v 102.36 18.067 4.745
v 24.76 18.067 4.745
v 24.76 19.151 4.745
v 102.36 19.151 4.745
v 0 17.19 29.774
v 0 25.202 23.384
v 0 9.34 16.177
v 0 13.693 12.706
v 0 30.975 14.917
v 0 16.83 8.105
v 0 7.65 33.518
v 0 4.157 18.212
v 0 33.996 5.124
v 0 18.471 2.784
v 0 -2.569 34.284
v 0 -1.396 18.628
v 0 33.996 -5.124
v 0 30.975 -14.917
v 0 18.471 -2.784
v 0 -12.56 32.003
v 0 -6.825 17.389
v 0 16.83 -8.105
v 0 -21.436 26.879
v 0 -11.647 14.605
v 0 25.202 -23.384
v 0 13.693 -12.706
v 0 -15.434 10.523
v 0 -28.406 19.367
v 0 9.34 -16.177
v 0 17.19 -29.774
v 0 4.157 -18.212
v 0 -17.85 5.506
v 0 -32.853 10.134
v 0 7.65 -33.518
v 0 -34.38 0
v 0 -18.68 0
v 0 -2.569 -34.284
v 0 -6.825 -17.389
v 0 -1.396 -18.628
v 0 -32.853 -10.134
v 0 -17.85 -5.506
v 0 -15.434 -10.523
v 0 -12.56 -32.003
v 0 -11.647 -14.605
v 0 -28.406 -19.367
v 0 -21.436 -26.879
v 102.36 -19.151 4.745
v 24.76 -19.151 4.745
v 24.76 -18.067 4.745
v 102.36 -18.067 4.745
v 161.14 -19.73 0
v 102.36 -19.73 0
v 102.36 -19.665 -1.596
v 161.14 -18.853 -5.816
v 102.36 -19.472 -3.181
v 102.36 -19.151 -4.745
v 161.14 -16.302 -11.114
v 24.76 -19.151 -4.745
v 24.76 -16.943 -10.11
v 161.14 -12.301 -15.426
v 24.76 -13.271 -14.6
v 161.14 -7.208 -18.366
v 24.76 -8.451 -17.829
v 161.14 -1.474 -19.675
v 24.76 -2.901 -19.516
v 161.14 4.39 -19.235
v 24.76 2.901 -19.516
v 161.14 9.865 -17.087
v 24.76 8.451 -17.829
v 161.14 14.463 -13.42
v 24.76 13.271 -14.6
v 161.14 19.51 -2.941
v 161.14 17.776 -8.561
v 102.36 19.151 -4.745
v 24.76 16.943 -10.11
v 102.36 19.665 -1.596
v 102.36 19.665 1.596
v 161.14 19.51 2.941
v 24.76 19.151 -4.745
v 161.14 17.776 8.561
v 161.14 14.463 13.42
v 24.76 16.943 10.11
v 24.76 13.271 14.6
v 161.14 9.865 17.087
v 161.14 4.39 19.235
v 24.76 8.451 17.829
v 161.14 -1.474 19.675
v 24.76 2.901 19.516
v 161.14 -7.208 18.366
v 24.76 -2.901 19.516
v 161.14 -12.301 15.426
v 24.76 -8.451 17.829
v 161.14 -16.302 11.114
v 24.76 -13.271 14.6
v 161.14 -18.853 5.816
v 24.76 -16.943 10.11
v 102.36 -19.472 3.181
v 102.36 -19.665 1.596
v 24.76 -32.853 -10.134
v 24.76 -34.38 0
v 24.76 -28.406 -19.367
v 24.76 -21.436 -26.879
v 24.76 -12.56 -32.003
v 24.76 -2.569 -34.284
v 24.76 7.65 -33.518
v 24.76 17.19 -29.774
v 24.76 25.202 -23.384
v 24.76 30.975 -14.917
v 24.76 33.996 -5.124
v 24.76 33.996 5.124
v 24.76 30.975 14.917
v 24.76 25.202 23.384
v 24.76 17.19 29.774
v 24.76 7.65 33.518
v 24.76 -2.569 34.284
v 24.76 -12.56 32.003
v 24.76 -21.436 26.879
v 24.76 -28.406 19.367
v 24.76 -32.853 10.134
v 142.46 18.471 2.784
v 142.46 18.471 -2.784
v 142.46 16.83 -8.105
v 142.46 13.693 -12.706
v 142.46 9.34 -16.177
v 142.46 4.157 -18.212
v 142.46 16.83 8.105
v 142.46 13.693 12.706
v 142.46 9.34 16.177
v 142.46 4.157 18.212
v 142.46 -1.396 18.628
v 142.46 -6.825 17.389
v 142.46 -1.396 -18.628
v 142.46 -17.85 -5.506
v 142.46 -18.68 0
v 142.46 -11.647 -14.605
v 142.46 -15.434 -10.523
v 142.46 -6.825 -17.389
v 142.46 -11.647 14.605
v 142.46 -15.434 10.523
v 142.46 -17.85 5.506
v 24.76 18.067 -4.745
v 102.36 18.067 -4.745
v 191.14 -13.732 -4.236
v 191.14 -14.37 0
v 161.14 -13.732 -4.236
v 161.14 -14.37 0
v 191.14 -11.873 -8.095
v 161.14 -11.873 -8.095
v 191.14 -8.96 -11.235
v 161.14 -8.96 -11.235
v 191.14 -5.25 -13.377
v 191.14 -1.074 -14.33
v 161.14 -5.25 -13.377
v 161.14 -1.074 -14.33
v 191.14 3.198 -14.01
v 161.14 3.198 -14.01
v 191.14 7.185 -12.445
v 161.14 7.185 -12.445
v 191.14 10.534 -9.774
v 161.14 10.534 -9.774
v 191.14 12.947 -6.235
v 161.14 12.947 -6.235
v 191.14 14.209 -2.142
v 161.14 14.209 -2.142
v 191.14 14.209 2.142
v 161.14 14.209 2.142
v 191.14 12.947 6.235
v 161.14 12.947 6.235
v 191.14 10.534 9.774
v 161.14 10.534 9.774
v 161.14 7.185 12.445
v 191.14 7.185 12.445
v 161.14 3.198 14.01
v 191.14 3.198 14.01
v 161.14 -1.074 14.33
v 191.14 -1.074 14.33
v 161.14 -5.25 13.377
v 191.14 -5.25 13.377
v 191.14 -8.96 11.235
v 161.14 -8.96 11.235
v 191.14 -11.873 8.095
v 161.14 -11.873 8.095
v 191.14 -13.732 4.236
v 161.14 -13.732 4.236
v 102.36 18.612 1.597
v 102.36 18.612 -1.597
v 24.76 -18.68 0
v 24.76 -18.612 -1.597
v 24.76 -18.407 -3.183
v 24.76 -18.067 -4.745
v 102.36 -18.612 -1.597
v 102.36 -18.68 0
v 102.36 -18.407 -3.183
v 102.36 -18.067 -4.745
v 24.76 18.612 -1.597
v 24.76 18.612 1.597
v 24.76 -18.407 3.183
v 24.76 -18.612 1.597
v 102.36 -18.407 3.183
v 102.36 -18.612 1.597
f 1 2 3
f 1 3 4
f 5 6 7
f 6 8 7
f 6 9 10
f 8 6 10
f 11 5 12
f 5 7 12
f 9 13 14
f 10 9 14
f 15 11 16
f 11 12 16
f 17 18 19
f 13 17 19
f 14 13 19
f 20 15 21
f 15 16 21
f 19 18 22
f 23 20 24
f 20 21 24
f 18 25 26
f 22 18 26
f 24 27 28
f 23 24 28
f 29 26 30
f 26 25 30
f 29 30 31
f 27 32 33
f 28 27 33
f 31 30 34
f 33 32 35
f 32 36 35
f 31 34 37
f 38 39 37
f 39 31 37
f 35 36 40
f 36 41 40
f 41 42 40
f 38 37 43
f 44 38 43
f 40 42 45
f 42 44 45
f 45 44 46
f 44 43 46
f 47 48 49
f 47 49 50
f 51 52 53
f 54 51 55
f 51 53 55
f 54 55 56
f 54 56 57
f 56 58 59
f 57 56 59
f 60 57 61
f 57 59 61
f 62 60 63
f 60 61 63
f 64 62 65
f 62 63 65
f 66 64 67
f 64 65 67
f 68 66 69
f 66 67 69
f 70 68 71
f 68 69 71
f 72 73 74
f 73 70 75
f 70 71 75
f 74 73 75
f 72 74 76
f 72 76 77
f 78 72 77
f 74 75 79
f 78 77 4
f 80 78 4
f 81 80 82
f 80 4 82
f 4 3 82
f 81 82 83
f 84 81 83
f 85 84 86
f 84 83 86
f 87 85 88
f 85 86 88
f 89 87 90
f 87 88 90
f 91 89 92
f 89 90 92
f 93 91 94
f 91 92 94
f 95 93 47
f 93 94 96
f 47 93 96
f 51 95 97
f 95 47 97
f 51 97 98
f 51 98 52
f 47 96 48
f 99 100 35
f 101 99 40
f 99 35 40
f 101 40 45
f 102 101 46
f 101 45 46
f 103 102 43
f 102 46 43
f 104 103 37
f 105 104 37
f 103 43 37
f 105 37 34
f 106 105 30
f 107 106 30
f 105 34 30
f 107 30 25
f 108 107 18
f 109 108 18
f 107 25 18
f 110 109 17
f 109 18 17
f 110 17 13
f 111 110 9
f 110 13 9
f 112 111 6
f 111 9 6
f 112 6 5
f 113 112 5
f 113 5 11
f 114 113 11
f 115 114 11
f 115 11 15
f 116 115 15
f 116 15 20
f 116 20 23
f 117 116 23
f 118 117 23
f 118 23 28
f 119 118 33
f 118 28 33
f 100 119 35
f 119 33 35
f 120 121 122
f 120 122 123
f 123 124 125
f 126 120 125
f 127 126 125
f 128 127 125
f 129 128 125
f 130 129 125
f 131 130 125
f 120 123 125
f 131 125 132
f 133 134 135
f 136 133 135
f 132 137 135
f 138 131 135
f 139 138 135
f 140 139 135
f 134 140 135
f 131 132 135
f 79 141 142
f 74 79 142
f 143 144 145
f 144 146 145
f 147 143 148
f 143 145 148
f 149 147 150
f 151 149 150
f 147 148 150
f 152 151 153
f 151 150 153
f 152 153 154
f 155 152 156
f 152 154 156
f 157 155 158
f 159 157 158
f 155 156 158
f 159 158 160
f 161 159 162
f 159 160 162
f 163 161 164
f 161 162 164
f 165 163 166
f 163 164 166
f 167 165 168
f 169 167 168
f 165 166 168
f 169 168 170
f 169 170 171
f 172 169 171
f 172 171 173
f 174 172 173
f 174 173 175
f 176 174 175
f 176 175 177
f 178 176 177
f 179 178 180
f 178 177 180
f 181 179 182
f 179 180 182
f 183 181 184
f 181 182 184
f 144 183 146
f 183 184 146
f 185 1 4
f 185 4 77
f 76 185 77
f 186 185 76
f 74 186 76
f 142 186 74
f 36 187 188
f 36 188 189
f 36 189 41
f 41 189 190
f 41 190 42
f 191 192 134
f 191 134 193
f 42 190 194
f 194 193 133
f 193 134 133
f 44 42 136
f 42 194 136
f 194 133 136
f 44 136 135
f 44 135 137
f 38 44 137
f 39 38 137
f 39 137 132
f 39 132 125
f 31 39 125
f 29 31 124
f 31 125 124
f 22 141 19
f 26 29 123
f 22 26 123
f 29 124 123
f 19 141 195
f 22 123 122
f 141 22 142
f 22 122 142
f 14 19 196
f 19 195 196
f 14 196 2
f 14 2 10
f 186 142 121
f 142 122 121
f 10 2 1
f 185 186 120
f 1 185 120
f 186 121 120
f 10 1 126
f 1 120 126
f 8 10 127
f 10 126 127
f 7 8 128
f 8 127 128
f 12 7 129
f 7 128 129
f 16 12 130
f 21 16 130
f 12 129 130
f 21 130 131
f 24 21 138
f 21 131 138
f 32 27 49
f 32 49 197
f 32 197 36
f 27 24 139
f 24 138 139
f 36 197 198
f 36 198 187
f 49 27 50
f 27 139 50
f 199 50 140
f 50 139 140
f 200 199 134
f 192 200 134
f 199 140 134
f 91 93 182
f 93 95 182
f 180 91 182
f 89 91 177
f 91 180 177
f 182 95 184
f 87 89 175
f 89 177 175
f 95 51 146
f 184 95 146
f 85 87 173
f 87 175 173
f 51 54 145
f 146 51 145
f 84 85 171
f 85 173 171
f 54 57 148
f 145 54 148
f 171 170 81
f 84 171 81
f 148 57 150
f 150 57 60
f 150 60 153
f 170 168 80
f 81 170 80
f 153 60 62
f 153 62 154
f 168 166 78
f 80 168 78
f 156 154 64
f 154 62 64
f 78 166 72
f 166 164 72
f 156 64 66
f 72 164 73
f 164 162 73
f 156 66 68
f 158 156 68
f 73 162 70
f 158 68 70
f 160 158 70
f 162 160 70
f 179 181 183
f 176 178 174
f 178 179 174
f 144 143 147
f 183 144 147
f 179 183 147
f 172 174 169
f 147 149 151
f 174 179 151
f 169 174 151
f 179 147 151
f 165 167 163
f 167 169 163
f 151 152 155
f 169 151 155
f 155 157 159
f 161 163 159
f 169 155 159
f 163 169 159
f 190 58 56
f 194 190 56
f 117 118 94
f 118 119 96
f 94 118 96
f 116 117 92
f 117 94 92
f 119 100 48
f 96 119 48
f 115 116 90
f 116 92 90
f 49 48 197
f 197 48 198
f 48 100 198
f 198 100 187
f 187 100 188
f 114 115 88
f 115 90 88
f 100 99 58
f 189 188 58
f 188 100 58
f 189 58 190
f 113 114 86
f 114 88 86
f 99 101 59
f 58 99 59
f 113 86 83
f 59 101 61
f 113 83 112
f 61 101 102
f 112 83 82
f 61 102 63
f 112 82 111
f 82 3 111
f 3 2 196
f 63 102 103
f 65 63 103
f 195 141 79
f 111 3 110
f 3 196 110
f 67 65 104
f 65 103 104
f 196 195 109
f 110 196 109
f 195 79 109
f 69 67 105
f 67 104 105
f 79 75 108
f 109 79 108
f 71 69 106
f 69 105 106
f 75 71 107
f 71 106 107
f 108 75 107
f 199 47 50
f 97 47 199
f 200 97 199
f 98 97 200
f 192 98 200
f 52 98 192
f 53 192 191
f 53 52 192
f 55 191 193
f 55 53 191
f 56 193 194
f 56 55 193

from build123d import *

# Parameters (mm, degrees)
CUT_EXTRUDE2_DEPTH      = 198.226946435
CUT_EXTRUDE2_DEPTH_BACK = 198.226946435
SKETCH3_W               = 77.6
SKETCH3_H               = 9.49


with BuildPart() as part:
    # Sketch1 → Revolve2 (revolve)
    with BuildSketch(Plane.XY, mode=Mode.PRIVATE) as revolve2_sk:
        Polygon((191.14, 0), (191.14, 14.37), (161.14, 14.37), (161.14, 19.73), (24.76, 19.73), (24.76, 34.38), (0, 34.38), (0, 18.68), (142.46, 18.68), (142.46, 0), align=None)
    revolve(revolve2_sk.sketch.rotate(Axis((0, 0, 0), (1, 0, 0)), 180), axis=Axis((0, 0, 0), (1, 0, 0)))

    # Sketch3 → Cut-Extrude2 (cut, two sides: drawn at the far end of the back side and taken through both)
    with BuildSketch(Plane(origin=(0, 0, 0), x_dir=(1, 0, 0), z_dir=(0, 1, 0)).offset(-CUT_EXTRUDE2_DEPTH_BACK)):
        with Locations((63.56, 0)):
            Rectangle(SKETCH3_W, SKETCH3_H)
    extrude(amount=CUT_EXTRUDE2_DEPTH + CUT_EXTRUDE2_DEPTH_BACK, mode=Mode.SUBTRACT)


solid = part.part
